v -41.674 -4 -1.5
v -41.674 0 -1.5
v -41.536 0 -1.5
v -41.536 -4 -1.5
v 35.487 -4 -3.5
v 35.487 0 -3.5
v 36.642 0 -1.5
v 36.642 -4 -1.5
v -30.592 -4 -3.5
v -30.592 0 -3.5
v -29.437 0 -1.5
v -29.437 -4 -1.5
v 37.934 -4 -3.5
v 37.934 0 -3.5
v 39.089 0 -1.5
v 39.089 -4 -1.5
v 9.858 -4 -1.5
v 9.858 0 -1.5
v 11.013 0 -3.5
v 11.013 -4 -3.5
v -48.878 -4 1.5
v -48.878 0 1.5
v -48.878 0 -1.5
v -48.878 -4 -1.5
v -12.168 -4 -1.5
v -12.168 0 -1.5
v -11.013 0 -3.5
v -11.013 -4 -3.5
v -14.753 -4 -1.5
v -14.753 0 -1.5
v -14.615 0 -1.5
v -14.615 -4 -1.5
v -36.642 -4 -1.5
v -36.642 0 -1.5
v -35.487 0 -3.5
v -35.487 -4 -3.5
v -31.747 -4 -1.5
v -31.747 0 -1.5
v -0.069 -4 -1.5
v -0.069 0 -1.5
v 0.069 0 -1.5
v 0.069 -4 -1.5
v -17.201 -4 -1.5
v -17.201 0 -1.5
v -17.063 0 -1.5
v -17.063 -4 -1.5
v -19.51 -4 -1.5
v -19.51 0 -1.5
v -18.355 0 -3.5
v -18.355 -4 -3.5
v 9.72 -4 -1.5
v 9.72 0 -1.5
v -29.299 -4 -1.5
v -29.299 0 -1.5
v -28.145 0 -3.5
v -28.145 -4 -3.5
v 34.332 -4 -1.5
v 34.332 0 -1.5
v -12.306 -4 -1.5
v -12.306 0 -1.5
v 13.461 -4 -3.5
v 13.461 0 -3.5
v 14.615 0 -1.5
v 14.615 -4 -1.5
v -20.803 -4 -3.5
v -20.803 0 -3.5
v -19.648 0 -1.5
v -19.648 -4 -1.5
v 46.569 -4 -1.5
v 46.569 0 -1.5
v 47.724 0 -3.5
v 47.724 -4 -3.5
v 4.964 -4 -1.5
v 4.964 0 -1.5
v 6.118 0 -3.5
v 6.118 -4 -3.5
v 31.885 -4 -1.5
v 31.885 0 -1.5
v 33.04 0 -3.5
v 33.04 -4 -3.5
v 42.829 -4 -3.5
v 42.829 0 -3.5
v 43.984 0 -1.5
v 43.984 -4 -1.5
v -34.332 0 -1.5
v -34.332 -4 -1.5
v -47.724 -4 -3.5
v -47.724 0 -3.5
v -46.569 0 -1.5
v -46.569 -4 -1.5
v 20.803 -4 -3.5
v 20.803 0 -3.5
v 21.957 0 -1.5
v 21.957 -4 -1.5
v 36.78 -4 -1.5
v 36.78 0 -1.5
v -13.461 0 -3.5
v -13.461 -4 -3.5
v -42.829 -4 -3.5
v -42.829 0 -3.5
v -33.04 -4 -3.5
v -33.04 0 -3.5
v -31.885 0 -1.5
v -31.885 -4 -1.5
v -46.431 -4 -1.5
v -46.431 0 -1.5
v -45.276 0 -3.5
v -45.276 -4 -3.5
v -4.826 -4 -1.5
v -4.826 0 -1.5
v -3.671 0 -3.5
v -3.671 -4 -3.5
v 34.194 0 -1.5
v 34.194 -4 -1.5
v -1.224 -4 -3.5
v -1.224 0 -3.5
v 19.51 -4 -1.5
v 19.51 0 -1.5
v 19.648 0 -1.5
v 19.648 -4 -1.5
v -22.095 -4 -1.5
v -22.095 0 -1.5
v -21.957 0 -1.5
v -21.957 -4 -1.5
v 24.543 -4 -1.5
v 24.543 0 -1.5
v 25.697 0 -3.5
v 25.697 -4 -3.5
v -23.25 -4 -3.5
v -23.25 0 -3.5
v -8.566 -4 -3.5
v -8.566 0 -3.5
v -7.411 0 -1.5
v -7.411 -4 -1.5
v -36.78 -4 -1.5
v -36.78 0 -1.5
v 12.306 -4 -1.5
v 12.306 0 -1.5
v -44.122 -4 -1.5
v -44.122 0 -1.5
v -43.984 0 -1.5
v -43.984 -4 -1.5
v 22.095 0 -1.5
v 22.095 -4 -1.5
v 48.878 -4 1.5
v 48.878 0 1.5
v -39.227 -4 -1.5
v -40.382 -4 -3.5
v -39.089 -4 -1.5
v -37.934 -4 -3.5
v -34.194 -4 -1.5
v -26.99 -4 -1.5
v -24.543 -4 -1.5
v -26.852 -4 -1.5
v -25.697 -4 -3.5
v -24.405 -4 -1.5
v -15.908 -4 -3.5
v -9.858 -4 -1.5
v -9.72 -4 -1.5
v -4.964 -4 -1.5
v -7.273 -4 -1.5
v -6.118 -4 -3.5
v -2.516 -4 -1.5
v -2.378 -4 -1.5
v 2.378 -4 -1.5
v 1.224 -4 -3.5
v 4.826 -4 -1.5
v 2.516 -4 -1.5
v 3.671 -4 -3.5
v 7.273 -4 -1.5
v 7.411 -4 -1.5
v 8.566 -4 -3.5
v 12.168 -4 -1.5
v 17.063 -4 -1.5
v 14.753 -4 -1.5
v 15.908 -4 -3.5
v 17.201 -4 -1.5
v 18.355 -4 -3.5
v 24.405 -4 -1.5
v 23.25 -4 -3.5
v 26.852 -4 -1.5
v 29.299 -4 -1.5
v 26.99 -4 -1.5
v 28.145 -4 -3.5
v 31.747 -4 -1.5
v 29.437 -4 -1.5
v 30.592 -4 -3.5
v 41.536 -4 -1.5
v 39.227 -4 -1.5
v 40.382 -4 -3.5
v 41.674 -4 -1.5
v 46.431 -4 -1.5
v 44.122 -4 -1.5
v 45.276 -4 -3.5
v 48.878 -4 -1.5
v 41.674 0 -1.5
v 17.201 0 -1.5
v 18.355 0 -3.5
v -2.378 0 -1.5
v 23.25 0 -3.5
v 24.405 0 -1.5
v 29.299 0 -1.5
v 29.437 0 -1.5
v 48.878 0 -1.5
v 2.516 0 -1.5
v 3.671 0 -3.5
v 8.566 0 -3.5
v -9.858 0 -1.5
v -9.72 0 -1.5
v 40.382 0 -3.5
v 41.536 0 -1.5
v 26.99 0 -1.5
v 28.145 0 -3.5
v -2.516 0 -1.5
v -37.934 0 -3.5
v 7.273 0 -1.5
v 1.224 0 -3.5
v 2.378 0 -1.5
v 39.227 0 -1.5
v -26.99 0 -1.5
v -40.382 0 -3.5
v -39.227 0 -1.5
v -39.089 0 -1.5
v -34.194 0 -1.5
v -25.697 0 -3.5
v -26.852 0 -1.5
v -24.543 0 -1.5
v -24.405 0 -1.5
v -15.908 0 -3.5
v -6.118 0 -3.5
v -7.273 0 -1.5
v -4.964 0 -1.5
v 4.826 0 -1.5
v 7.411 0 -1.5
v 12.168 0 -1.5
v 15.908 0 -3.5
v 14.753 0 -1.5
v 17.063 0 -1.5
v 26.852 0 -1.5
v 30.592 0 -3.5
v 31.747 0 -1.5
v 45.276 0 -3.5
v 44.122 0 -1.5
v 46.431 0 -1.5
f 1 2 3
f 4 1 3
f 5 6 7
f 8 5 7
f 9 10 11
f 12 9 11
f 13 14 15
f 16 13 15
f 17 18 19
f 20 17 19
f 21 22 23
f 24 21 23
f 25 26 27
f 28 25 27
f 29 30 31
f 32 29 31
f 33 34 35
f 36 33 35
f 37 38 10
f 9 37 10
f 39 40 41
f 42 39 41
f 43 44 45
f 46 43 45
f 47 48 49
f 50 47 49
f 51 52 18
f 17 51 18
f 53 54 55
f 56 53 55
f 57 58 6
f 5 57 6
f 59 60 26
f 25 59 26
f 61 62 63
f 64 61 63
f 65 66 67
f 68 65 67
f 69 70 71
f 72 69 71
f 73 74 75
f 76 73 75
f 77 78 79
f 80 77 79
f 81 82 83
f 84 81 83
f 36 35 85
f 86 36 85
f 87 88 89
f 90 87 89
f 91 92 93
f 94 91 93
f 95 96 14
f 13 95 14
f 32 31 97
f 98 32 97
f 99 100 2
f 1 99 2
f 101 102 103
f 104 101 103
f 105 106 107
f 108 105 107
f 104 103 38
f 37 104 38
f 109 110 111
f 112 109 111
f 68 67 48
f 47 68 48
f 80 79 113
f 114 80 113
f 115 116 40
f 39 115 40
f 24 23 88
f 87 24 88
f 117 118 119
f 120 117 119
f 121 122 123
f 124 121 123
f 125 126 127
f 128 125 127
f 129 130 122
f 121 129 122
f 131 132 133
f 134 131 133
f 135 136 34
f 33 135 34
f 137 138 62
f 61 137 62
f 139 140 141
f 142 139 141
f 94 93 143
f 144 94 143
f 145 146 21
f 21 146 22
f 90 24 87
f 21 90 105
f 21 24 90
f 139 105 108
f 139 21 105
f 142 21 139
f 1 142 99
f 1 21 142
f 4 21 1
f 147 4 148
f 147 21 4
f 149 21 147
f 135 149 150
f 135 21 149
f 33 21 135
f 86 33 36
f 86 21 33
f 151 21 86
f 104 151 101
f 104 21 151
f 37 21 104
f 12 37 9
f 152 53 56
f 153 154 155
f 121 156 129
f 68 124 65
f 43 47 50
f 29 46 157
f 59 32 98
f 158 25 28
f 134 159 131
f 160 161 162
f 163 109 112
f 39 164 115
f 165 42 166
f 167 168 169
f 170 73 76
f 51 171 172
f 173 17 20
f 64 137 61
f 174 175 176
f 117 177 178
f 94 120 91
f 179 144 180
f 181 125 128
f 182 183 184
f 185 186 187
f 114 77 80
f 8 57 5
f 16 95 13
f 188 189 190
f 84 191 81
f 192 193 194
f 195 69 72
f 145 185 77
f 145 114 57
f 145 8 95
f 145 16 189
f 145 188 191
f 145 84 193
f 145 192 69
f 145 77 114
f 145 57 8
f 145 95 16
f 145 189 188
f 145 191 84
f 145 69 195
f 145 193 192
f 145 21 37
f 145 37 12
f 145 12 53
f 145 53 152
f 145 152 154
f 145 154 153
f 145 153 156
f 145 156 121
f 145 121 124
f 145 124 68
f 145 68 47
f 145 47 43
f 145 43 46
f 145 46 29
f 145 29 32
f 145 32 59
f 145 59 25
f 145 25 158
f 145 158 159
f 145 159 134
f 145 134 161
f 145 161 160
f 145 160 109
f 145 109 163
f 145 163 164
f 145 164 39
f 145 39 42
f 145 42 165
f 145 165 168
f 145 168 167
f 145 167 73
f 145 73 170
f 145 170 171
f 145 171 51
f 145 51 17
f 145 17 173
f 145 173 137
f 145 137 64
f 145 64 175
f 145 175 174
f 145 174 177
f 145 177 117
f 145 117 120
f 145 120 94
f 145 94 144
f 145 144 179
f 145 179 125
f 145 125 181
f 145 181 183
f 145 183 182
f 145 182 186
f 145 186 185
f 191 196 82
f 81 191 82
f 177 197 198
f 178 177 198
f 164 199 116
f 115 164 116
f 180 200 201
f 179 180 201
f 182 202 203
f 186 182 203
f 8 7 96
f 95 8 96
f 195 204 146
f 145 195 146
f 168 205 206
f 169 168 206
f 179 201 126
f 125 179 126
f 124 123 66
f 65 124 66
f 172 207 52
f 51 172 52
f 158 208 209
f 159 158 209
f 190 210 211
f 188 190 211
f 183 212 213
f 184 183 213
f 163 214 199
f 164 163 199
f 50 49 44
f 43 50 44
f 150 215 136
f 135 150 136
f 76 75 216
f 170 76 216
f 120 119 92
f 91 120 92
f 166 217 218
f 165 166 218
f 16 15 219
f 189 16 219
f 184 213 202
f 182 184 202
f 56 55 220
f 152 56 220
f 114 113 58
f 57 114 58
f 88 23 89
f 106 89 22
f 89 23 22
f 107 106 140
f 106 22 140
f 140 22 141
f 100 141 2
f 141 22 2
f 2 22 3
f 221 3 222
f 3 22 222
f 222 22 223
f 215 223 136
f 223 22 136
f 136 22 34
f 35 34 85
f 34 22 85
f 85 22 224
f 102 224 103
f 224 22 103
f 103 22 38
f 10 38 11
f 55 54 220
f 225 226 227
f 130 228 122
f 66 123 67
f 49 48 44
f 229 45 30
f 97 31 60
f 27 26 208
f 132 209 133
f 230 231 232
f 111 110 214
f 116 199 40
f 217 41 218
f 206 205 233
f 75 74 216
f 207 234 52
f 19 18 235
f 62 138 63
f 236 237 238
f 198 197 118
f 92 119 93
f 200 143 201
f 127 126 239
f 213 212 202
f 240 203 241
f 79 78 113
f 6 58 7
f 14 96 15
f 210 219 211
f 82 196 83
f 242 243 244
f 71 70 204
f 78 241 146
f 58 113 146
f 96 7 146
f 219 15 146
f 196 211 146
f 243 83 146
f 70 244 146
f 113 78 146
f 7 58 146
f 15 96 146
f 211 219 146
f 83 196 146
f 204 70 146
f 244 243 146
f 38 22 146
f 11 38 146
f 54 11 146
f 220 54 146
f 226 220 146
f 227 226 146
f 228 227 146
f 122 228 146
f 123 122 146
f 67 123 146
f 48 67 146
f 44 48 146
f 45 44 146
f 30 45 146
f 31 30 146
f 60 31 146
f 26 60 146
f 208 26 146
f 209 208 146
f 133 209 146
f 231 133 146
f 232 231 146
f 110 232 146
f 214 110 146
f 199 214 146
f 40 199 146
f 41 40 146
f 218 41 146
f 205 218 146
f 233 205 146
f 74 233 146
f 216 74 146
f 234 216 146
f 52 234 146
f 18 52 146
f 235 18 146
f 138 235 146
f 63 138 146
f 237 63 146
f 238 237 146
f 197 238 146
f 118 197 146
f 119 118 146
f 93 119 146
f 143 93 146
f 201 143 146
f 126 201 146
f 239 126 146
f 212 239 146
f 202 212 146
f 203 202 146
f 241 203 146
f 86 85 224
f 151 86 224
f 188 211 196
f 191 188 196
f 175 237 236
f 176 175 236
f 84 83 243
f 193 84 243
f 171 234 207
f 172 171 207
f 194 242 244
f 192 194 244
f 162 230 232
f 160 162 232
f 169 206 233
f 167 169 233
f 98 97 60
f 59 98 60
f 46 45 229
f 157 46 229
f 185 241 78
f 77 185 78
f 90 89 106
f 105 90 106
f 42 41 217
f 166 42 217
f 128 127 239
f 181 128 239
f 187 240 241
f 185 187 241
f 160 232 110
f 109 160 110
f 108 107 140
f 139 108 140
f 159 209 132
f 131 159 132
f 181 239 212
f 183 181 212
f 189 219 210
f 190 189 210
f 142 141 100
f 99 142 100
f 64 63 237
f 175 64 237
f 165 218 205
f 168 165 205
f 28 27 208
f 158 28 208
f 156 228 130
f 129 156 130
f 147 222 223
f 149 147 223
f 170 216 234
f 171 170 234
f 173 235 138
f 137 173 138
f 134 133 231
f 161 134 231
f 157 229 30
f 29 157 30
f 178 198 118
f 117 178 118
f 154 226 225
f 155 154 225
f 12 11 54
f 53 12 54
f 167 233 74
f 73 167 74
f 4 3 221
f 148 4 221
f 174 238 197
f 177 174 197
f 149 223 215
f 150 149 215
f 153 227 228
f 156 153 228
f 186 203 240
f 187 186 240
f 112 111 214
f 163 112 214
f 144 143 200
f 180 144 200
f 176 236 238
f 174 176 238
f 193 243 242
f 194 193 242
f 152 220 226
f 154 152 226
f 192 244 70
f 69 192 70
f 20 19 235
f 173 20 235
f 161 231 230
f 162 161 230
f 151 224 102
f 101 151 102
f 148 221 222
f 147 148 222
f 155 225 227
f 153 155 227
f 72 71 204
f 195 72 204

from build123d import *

# Parameters (mm, degrees)
F1_DEPTH = 4


# Not quite as in the source:
# - ends of sketch curves that miss each other by under 0.0002 mm in the source are joined


with BuildPart() as f1:
    # F0 (on Front) → F1 (new body)
    with BuildSketch(Plane.XZ):
        Polygon((48.878435, 1.5), (-48.878435, 1.5), (-48.878435, -1.5), (-46.5690339232, -1.5), (-46.4310674122, -1.5), (-44.1216663354, -1.5), (-43.9836963354, -1.5), (-41.6742952587, -1.5), (-41.5363252587, -1.5), (-39.22692239, -1.5), (-39.08895239, -1.5), (-36.7795513132, -1.5), (-36.6415813132, -1.5), (-34.3321802365, -1.5), (-34.1942102365, -1.5), (-31.8848091597, -1.5), (-31.7468391597, -1.5), (-29.4374380829, -1.5), (-29.2994680829, -1.5), (-26.9900670062, -1.5), (-26.8520970062, -1.5), (-24.5426959294, -1.5), (-24.4047259294, -1.5), (-22.0953248527, -1.5), (-21.9573548527, -1.5), (-19.6479537759, -1.5), (-19.5099837759, -1.5), (-17.2005822649, -1.5), (-17.062612265, -1.5), (-14.7532111882, -1.5), (-14.6152411882, -1.5), (-12.3058401114, -1.5), (-12.1678701114, -1.5), (-9.8584690347, -1.5), (-9.7204990347, -1.5), (-7.4110979579, -1.5), (-7.2731279579, -1.5), (-4.9637268812, -1.5), (-4.8257568812, -1.5), (-2.5163558044, -1.5), (-2.3783858044, -1.5), (-0.0689847276, -1.5), (0.0689852724, -1.5), (2.3783863491, -1.5), (2.5163563491, -1.5), (4.8257574259, -1.5), (4.9637274259, -1.5), (7.2731285026, -1.5), (7.4110985026, -1.5), (9.7204995794, -1.5), (9.8584695794, -1.5), (12.1678706561, -1.5), (12.3058406561, -1.5), (14.6152417329, -1.5), (14.7532117329, -1.5), (17.0626128097, -1.5), (17.2005828097, -1.5), (19.5099838864, -1.5), (19.6479538864, -1.5), (21.5619457761, -1.5), (21.9573549632, -1.5), (22.0953249632, -1.5), (23.8713468528, -1.5), (24.4047260399, -1.5), (24.5426960399, -1.5), (26.8520971167, -1.5), (26.9900671167, -1.5), (29.2994681935, -1.5), (29.4374381935, -1.5), (31.7468392702, -1.5), (31.8848092702, -1.5), (34.194210347, -1.5), (34.332180347, -1.5), (36.6415814237, -1.5), (36.7795514237, -1.5), (39.0889525005, -1.5), (39.2269225005, -1.5), (41.5363235773, -1.5), (41.6742935773, -1.5), (43.983694654, -1.5), (44.121664654, -1.5), (46.4310657308, -1.5), (46.5690357308, -1.5), (48.878435, -1.5), align=None)
        Polygon((-46.5690339232, -1.5), (-48.878435, -1.5), (-47.7237344616, -3.5), align=None)
        Polygon((47.7237362691, -3.5), (48.8784368075, -1.5), (46.5690357308, -1.5), align=None)
        Polygon((-44.1216663354, -1.5), (-46.4310674122, -1.5), (-45.2763668738, -3.5), align=None)
        Polygon((45.2763651924, -3.5), (46.4310657308, -1.5), (44.121664654, -1.5), align=None)
        Polygon((-41.6742952587, -1.5), (-43.9836963354, -1.5), (-42.8289957971, -3.5), align=None)
        Polygon((42.8289941156, -3.5), (43.983694654, -1.5), (41.6742935773, -1.5), align=None)
        Polygon((-39.22692239, -1.5), (-41.5363252587, -1.5), (-40.3816238243, -3.5), align=None)
        Polygon((40.3816230389, -3.5), (41.5363235773, -1.5), (39.2269225005, -1.5), align=None)
        Polygon((-36.7795513132, -1.5), (-39.08895239, -1.5), (-37.9342518516, -3.5), align=None)
        Polygon((37.9342519621, -3.5), (39.0889525005, -1.5), (36.7795514237, -1.5), align=None)
        Polygon((-34.3321802365, -1.5), (-36.6415813132, -1.5), (-35.4868807748, -3.5), align=None)
        Polygon((35.4868808854, -3.5), (36.6415814237, -1.5), (34.332180347, -1.5), align=None)
        Polygon((-31.8848091597, -1.5), (-34.1942102365, -1.5), (-33.0395096981, -3.5), align=None)
        Polygon((33.0395098086, -3.5), (34.194210347, -1.5), (31.8848092702, -1.5), align=None)
        Polygon((-29.4374380829, -1.5), (-31.7468391597, -1.5), (-30.5921386213, -3.5), align=None)
        Polygon((30.5921387318, -3.5), (31.7468392702, -1.5), (29.4374381935, -1.5), align=None)
        Polygon((-26.9900670062, -1.5), (-29.2994680829, -1.5), (-28.1447675446, -3.5), align=None)
        Polygon((28.1447676551, -3.5), (29.2994681935, -1.5), (26.9900671167, -1.5), align=None)
        Polygon((-24.5426959294, -1.5), (-26.8520970062, -1.5), (-25.6973964678, -3.5), align=None)
        Polygon((25.6973965783, -3.5), (26.8520971167, -1.5), (24.5426960399, -1.5), align=None)
        Polygon((-22.0953248527, -1.5), (-24.4047259294, -1.5), (-23.250025391, -3.5), align=None)
        Polygon((23.2500255016, -3.5), (24.4047260399, -1.5), (23.8713468528, -1.5), (22.0953249632, -1.5), align=None)
        Polygon((-19.6479537759, -1.5), (-21.9573548527, -1.5), (-20.8026543143, -3.5), align=None)
        Polygon((20.8026544248, -3.5), (21.9573549632, -1.5), (21.5619457761, -1.5), (19.6479538864, -1.5), align=None)
        Polygon((-17.2005822649, -1.5), (-19.5099837759, -1.5), (-18.3552830204, -3.500000376), align=None)
        Polygon((-14.7532111882, -1.5), (-17.062612265, -1.5), (-15.9079117266, -3.5), align=None)
        Polygon((18.355283348, -3.5), (19.5099838864, -1.5), (17.2005828097, -1.5), align=None)
        Polygon((-12.3058401114, -1.5), (-14.6152411882, -1.5), (-13.4605406498, -3.5), align=None)
        Polygon((15.9079122713, -3.5), (17.0626128097, -1.5), (14.7532117329, -1.5), align=None)
        Polygon((-9.8584690347, -1.5), (-12.1678701114, -1.5), (-11.0131695731, -3.5), align=None)
        Polygon((13.4605411945, -3.5), (14.6152417329, -1.5), (12.3058406561, -1.5), align=None)
        Polygon((-7.4110979579, -1.5), (-9.7204990347, -1.5), (-8.5657984963, -3.5), align=None)
        Polygon((11.0131701178, -3.5), (12.1678706561, -1.5), (9.8584695794, -1.5), align=None)
        Polygon((-4.9637268812, -1.5), (-7.2731279579, -1.5), (-6.1184274195, -3.5), align=None)
        Polygon((8.565799041, -3.5), (9.7204995794, -1.5), (7.4110985026, -1.5), align=None)
        Polygon((-2.5163558044, -1.5), (-4.8257568812, -1.5), (-3.6710563428, -3.5), align=None)
        Polygon((6.1184279642, -3.5), (7.2731285026, -1.5), (4.9637274259, -1.5), align=None)
        Polygon((-0.0689847276, -1.5), (-2.3783858044, -1.5), (-1.223685266, -3.5), align=None)
        Polygon((3.6710568875, -3.5), (4.8257574259, -1.5), (2.5163563491, -1.5), align=None)
        Polygon((2.3783863491, -1.5), (0.0689852724, -1.5), (1.2236858107, -3.5), align=None)
    extrude(amount=F1_DEPTH)


solid = f1.part
